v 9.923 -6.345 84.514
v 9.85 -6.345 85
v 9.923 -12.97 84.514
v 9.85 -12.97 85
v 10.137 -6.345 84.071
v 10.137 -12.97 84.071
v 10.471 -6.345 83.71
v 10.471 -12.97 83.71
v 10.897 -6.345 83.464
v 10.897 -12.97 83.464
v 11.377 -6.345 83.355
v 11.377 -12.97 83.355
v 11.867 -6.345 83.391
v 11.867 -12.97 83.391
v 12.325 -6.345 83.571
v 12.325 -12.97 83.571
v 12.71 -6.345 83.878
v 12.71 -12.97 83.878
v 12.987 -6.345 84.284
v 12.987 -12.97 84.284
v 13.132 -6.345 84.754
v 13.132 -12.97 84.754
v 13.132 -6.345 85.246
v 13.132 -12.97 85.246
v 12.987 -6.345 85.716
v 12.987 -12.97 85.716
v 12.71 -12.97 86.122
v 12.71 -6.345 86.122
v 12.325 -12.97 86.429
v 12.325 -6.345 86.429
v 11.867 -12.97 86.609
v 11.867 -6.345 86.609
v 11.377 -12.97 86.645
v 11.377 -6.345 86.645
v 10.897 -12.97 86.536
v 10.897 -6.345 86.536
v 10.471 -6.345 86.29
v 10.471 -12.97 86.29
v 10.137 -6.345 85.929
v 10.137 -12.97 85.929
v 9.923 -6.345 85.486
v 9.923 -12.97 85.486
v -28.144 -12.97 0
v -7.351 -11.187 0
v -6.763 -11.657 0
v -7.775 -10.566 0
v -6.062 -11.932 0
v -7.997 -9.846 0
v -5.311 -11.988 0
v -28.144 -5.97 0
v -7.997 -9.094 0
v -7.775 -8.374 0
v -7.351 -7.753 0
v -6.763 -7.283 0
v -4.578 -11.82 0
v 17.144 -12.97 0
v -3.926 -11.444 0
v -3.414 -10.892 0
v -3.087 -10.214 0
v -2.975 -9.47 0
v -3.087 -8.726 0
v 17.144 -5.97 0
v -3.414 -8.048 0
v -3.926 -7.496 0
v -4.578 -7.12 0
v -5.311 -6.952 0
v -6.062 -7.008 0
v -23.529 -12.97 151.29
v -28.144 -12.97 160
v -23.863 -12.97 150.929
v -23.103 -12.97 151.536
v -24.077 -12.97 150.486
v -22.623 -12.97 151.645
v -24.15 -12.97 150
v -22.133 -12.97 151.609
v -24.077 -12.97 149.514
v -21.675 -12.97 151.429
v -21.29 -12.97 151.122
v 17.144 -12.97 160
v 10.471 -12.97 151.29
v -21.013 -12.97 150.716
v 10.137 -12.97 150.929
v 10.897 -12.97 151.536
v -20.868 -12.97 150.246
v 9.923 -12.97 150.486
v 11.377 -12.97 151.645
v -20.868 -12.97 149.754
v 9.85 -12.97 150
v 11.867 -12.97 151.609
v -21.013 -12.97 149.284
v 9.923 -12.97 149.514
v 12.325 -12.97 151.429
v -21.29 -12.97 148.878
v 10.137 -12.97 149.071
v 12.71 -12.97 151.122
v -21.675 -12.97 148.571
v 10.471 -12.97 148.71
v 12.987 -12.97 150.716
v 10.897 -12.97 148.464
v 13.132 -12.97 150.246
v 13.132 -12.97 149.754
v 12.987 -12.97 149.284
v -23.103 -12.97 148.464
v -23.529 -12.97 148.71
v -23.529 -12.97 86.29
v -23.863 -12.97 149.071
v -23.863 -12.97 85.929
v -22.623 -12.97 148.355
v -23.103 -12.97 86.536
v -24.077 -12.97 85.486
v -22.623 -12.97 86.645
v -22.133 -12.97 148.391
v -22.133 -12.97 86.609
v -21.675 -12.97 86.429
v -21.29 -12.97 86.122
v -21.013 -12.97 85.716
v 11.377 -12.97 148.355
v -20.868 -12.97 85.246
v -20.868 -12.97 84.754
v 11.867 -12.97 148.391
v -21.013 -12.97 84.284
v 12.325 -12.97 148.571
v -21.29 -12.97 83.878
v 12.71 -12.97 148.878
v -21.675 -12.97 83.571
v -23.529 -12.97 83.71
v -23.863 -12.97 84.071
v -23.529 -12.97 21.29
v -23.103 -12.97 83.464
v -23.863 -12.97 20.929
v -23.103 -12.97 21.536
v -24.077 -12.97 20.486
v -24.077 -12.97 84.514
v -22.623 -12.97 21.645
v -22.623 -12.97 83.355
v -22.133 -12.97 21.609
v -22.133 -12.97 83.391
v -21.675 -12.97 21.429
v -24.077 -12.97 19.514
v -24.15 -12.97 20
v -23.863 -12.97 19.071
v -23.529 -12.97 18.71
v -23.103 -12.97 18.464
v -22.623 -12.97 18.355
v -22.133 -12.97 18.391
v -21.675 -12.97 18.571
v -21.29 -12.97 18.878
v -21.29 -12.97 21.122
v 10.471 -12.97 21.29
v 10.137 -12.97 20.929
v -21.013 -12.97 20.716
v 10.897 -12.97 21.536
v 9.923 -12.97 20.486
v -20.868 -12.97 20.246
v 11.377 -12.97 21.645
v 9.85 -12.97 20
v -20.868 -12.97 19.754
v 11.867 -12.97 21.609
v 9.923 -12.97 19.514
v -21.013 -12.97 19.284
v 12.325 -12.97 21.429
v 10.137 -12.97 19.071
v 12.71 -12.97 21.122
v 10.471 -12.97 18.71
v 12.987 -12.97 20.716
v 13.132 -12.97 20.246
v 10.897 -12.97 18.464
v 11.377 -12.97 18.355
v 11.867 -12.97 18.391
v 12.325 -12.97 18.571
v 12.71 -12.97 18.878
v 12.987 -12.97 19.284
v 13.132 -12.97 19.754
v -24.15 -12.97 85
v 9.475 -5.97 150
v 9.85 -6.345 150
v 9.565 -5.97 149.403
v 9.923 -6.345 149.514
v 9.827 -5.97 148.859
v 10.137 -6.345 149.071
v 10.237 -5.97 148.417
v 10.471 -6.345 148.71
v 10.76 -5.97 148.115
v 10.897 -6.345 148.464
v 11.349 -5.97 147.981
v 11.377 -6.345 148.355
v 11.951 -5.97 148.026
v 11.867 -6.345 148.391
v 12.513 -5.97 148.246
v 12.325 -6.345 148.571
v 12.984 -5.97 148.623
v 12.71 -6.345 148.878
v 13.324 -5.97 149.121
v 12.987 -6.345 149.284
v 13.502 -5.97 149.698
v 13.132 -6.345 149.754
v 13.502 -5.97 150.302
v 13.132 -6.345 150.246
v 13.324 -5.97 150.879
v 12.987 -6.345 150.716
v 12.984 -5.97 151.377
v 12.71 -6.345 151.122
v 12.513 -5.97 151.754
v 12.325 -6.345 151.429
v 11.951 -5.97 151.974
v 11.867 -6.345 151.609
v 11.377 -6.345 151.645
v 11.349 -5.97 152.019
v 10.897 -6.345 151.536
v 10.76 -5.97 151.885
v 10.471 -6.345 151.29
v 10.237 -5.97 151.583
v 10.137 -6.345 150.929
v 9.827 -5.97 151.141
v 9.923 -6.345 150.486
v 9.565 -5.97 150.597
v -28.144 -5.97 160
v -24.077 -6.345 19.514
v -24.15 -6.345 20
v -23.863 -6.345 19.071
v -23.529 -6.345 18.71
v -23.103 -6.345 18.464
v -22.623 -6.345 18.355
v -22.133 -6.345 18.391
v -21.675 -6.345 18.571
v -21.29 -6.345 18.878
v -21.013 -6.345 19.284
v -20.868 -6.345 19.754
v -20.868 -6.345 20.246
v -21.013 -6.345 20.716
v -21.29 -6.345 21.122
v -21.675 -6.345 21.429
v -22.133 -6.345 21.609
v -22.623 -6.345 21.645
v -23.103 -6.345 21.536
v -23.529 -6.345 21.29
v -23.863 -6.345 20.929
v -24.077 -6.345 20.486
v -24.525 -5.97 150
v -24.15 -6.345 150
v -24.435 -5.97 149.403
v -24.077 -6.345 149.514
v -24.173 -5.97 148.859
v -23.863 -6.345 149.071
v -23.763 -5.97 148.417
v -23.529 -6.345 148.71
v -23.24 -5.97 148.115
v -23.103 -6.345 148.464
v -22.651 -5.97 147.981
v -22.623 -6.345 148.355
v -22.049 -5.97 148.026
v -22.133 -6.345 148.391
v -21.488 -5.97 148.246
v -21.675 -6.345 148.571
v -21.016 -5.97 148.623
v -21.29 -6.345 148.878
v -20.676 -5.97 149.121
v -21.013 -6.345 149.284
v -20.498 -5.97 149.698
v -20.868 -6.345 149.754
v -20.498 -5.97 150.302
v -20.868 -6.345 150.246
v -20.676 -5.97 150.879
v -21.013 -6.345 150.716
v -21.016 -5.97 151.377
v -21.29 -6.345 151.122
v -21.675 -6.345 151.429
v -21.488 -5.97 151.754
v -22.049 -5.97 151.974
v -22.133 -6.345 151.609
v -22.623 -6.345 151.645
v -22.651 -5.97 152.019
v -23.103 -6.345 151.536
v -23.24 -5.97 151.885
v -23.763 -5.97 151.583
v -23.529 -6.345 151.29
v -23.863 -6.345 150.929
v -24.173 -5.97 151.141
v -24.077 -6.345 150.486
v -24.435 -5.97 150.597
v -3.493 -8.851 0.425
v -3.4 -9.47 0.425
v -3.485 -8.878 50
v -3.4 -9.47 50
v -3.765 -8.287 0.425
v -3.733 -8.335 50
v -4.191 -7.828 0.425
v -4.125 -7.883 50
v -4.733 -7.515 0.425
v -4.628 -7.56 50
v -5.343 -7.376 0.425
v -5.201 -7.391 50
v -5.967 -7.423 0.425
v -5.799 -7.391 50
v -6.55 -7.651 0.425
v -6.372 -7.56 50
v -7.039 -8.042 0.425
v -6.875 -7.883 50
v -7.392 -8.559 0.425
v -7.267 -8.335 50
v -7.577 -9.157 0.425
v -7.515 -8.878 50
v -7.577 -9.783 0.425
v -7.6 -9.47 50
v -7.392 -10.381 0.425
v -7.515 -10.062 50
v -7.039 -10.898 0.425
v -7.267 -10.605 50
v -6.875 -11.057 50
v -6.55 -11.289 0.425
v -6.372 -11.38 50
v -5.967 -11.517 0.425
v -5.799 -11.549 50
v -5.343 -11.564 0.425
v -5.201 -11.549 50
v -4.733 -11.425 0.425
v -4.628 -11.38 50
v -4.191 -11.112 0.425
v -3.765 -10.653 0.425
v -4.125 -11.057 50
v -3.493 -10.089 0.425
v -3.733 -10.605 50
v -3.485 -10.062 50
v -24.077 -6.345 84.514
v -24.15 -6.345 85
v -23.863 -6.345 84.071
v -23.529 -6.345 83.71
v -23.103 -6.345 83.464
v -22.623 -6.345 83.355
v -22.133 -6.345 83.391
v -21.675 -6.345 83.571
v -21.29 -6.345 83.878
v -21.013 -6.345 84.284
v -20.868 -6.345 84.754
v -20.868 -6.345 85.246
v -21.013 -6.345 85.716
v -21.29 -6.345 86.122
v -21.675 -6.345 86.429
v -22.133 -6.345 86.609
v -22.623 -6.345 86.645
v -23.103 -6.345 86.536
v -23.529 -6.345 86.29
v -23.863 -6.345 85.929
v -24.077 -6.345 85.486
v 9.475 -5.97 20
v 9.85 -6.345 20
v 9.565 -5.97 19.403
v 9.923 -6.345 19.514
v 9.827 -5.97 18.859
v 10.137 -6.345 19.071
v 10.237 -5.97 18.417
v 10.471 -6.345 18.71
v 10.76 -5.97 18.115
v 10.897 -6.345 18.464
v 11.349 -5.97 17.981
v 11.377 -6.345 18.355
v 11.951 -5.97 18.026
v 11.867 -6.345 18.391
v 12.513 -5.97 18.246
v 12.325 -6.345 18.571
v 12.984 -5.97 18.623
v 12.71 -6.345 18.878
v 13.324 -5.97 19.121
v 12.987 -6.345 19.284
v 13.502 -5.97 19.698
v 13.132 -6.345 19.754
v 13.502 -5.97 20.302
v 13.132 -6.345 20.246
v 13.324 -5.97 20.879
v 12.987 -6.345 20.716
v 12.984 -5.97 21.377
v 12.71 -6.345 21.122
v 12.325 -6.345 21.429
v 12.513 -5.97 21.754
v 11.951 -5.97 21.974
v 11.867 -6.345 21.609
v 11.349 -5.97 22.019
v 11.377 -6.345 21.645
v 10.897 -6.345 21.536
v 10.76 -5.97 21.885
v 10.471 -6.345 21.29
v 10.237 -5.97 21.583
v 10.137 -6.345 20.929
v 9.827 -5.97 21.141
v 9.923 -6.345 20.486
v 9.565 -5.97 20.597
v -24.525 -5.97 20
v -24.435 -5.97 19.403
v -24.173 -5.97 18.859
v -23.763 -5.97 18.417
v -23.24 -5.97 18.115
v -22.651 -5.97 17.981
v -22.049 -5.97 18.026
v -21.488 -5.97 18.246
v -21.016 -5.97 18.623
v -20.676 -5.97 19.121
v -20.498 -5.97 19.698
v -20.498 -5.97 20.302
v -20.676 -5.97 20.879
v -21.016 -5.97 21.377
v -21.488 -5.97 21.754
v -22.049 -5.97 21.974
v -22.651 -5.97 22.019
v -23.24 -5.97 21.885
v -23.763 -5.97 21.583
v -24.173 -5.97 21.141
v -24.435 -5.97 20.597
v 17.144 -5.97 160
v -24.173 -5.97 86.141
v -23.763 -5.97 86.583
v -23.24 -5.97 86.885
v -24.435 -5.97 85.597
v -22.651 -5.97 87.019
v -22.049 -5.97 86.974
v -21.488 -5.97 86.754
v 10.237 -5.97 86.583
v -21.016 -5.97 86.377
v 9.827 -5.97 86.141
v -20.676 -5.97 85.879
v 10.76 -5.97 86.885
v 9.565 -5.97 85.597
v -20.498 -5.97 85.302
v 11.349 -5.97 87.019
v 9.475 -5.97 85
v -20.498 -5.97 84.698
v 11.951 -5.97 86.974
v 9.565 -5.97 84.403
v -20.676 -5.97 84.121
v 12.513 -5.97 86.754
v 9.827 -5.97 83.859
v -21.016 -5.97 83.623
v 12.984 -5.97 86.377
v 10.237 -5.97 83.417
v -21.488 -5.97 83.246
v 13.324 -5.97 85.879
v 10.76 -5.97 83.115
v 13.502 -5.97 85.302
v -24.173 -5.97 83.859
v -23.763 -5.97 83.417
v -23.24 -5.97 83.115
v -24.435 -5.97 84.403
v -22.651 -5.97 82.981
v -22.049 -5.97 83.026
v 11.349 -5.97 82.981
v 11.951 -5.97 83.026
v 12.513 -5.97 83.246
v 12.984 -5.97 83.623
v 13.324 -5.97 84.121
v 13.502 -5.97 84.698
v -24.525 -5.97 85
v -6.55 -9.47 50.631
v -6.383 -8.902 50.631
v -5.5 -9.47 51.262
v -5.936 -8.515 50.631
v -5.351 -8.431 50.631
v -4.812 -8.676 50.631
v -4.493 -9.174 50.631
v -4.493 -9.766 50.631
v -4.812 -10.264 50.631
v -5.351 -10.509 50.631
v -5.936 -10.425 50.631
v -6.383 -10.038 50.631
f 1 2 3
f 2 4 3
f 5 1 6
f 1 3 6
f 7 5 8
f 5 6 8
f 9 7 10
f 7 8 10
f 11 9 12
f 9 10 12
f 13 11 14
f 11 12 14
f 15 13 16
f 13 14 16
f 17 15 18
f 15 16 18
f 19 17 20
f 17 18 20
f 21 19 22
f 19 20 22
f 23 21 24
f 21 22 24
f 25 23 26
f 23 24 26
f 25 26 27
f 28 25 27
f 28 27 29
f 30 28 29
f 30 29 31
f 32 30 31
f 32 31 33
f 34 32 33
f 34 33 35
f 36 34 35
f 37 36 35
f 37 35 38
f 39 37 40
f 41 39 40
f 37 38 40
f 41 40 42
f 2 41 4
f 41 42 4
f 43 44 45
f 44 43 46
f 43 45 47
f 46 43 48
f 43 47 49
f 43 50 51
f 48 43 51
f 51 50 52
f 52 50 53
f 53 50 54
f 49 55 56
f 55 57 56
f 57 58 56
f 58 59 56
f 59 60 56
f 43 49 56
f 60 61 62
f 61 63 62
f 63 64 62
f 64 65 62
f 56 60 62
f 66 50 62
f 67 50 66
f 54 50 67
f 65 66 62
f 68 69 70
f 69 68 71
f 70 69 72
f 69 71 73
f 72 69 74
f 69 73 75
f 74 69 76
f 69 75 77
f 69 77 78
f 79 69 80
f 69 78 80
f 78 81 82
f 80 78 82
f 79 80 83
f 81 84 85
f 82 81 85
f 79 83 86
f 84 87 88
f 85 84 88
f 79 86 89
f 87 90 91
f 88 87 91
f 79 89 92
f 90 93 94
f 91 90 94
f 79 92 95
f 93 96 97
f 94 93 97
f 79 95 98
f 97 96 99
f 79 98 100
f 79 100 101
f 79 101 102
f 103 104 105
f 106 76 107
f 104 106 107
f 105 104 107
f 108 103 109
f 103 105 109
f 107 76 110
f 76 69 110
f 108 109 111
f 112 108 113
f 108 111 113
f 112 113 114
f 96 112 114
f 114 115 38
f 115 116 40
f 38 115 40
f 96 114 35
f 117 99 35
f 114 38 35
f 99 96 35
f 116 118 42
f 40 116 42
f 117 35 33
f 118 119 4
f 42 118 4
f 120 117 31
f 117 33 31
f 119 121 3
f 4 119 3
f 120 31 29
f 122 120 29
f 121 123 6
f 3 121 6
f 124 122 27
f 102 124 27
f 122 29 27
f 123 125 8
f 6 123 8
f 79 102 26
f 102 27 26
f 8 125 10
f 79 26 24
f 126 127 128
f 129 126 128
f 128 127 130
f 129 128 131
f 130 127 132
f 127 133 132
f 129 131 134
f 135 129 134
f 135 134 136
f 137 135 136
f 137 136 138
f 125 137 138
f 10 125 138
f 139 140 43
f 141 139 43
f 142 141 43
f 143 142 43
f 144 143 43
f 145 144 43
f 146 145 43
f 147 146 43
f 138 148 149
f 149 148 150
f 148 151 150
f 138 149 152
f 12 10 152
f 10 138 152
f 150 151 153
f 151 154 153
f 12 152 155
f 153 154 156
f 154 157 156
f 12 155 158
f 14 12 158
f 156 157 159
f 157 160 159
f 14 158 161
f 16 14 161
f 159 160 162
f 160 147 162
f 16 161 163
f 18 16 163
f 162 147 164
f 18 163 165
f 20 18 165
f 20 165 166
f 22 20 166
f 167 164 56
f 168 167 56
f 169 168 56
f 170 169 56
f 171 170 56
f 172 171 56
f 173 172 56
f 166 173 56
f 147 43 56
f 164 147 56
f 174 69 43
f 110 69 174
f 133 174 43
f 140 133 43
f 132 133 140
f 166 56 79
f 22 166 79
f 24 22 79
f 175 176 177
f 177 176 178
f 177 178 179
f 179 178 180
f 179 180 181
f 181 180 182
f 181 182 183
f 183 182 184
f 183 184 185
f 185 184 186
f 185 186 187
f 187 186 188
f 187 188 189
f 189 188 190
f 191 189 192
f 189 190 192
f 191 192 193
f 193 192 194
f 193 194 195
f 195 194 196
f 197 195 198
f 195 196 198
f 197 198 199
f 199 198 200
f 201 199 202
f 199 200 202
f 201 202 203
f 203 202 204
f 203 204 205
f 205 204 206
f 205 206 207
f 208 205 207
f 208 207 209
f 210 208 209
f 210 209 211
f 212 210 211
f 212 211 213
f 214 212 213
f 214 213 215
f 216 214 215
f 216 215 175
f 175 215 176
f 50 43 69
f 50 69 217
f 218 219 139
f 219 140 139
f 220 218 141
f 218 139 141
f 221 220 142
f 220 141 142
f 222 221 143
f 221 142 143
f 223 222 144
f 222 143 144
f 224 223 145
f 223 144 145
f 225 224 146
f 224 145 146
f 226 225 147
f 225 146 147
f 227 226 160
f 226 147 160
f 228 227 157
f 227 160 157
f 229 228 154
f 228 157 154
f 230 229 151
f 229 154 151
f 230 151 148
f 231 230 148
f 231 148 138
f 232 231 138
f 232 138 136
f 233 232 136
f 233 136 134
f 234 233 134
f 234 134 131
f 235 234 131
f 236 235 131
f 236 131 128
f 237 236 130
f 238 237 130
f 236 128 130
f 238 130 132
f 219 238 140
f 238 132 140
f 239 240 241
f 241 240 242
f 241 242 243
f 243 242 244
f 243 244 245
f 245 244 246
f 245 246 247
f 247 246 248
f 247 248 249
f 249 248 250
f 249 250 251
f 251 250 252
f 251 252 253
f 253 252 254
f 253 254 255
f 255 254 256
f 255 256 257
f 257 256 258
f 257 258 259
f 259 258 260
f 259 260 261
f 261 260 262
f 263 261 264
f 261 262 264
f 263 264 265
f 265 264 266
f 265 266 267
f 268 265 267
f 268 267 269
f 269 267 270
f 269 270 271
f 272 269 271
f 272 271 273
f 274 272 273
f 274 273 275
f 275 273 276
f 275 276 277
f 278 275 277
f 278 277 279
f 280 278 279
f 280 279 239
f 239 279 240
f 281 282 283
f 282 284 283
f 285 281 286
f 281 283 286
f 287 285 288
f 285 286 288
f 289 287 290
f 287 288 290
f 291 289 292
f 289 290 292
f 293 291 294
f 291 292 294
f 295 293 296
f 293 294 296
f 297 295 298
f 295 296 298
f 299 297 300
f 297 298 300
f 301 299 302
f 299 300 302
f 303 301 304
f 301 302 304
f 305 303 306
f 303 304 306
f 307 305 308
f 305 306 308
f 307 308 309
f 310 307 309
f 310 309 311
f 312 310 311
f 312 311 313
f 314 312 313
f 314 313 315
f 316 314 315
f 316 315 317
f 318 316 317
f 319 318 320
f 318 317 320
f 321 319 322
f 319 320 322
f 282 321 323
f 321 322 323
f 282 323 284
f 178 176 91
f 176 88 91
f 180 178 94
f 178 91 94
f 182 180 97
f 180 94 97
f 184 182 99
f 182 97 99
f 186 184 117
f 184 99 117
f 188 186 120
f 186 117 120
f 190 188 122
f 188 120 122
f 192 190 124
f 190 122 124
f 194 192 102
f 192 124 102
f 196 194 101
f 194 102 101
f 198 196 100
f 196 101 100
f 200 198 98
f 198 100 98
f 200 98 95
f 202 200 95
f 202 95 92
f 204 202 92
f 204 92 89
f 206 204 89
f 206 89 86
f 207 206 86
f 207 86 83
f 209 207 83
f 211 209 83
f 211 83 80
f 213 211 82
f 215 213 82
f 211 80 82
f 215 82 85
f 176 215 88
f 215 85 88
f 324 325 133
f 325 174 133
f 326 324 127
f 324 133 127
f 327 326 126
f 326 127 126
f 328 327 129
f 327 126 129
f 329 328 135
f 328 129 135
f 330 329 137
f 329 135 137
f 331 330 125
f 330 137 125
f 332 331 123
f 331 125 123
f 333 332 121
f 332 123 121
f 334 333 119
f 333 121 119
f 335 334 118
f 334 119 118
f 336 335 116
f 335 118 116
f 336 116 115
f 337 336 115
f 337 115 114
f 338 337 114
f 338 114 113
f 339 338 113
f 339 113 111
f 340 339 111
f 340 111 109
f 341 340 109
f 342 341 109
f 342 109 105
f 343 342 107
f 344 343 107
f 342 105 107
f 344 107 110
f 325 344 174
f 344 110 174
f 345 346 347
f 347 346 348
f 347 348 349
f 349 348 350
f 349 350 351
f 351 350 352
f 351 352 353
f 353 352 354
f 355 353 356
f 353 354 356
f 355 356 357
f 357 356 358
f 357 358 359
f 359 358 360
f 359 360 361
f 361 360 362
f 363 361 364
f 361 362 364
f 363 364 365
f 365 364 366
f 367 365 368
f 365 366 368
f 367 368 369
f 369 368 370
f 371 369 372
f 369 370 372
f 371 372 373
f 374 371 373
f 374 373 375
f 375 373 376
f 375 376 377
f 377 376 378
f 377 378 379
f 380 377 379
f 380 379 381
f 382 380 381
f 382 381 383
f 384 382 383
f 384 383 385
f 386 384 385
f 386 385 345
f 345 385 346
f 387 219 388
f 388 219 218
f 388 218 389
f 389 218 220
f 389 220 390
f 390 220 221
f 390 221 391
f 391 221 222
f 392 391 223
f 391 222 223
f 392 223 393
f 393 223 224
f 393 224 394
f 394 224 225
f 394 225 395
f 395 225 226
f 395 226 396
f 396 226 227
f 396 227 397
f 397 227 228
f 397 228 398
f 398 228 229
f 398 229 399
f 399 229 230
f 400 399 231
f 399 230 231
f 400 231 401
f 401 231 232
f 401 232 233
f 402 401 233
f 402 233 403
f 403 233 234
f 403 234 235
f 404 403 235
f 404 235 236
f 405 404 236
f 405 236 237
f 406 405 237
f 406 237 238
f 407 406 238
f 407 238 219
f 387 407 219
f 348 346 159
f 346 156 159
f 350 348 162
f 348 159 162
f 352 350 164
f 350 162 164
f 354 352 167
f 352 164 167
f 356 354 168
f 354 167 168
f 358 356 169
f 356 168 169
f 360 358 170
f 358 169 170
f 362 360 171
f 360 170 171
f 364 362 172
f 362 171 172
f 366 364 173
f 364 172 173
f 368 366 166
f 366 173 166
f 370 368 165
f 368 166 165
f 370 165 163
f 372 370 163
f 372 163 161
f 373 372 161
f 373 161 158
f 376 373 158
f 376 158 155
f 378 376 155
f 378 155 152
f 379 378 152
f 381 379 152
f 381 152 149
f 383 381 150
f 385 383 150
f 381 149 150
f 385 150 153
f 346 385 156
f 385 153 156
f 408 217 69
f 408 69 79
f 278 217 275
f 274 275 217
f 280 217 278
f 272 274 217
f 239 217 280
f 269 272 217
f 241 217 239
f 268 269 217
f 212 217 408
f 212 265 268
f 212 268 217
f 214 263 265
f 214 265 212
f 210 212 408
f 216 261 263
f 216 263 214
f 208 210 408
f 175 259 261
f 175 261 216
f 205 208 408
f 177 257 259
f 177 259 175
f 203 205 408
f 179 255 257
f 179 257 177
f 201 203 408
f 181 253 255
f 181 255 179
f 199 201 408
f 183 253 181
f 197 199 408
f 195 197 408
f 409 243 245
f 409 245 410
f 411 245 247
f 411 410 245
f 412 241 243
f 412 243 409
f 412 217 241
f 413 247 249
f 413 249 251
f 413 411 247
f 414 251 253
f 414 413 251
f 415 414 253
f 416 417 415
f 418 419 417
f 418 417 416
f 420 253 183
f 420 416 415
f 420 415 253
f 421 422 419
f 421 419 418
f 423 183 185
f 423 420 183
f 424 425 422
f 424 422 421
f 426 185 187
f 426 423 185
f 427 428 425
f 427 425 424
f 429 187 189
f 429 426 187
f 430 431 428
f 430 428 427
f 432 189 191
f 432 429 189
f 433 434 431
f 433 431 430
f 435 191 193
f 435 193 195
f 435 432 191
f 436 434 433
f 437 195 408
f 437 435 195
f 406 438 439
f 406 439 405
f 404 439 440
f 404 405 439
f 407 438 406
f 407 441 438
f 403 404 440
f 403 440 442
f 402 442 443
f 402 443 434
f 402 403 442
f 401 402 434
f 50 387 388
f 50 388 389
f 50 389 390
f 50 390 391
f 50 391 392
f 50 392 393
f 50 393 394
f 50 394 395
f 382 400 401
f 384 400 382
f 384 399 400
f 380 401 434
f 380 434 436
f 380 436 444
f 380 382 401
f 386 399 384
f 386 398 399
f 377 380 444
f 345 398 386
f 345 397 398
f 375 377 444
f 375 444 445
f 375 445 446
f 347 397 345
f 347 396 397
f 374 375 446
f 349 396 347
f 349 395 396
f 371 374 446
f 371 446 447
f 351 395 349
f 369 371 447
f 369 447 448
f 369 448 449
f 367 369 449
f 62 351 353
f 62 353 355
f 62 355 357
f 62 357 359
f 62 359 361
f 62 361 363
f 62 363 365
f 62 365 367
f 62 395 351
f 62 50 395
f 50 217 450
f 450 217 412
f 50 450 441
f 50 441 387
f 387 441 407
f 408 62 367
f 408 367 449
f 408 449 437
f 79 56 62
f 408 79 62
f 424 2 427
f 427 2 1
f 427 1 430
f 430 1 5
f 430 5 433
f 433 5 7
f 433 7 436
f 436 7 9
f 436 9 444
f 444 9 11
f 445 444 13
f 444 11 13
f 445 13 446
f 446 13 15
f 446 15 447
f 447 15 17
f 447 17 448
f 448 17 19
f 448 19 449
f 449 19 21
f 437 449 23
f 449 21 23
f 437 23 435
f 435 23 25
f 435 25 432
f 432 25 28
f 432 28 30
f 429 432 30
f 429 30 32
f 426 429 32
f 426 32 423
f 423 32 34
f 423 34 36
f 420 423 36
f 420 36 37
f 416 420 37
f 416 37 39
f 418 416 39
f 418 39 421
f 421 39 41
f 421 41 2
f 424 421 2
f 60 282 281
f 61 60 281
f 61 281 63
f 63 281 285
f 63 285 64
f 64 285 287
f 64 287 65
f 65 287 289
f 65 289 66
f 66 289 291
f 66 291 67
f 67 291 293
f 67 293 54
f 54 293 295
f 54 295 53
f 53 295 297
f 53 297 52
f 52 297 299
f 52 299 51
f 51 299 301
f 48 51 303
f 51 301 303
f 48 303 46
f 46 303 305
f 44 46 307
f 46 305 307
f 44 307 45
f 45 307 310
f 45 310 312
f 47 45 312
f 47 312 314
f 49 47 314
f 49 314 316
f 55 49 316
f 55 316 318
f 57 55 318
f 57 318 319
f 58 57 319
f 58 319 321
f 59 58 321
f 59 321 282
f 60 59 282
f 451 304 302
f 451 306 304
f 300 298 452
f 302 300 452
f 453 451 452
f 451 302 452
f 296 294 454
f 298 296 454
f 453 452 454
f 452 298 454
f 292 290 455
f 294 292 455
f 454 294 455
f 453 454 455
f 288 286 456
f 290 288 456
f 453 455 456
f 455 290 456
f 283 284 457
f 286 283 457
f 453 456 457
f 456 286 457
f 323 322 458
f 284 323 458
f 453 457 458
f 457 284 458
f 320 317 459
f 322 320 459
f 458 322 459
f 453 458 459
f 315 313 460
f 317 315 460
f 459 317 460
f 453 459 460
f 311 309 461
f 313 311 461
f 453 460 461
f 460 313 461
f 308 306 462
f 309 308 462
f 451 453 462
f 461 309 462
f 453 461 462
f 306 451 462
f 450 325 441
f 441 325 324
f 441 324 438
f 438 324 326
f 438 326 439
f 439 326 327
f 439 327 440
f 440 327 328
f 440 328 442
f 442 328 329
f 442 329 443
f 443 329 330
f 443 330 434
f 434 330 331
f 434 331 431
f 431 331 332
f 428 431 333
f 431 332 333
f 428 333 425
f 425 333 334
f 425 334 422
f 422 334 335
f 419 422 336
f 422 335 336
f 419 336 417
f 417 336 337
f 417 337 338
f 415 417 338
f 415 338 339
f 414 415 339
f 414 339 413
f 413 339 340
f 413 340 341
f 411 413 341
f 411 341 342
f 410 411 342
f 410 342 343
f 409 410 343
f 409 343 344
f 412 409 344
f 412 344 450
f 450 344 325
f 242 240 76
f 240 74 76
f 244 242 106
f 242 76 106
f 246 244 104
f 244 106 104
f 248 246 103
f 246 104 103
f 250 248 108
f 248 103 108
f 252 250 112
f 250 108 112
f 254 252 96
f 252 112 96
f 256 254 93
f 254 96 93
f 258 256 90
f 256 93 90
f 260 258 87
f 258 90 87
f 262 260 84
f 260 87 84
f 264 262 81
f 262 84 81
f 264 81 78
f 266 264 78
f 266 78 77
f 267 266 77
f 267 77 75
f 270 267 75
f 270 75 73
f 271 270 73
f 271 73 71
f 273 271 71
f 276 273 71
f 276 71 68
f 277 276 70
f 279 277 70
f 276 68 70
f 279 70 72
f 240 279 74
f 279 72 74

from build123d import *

# Parameters (mm, degrees)
ESQUISSE1_W                 = 45.287967496
ESQUISSE1_H                 = 7
BOSS_EXTRU_1_DEPTH          = 160
TROU_TARAUD_M41_D           = 3.3
TROU_TARAUD_M41_CSINK_D     = 4.05
TROU_TARAUD_M41_CSINK_ANGLE = 90
TROU_TARAUD_M53_D           = 4.2
TROU_TARAUD_M53_DEPTH       = 50
TROU_TARAUD_M53_CSINK_D     = 5.05
TROU_TARAUD_M53_CSINK_ANGLE = 90
TROU_TARAUD_M53_TIP         = 1.2618073


with BuildPart() as part:
    # Esquisse1 → Boss.-Extru.1 (new body)
    with BuildSketch(Plane.XY):
        with Locations((-5.5, -9.47)):
            Rectangle(ESQUISSE1_W, ESQUISSE1_H)
    extrude(amount=BOSS_EXTRU_1_DEPTH)

    # Trou taraudé M41 (through all)
    with Locations(Plane(origin=(0.354832292, -5.97, 0), x_dir=(1, 0, 0), z_dir=(0, 1, 0))):
        with Locations((-22.854832292, -20), (-22.854832292, -85), (-22.854832292, -150), (11.145167708, -150), (11.145167708, -85), (11.145167708, -20)):
            CounterSinkHole(TROU_TARAUD_M41_D / 2, TROU_TARAUD_M41_CSINK_D / 2, counter_sink_angle=TROU_TARAUD_M41_CSINK_ANGLE)

    # Trou taraudé M53
    with Locations(Plane(origin=(0, 0, 0), x_dir=(-1, 0, 0), z_dir=(0, 0, -1))):
        with Locations((5.5, -9.47)):
            CounterSinkHole(TROU_TARAUD_M53_D / 2, TROU_TARAUD_M53_CSINK_D / 2, depth=TROU_TARAUD_M53_DEPTH, counter_sink_angle=TROU_TARAUD_M53_CSINK_ANGLE)
            with Locations((0, 0, -(TROU_TARAUD_M53_DEPTH + TROU_TARAUD_M53_TIP / 2))):  # 118° drill point
                Cone(0, TROU_TARAUD_M53_D / 2, TROU_TARAUD_M53_TIP, mode=Mode.SUBTRACT)


solid = part.part
